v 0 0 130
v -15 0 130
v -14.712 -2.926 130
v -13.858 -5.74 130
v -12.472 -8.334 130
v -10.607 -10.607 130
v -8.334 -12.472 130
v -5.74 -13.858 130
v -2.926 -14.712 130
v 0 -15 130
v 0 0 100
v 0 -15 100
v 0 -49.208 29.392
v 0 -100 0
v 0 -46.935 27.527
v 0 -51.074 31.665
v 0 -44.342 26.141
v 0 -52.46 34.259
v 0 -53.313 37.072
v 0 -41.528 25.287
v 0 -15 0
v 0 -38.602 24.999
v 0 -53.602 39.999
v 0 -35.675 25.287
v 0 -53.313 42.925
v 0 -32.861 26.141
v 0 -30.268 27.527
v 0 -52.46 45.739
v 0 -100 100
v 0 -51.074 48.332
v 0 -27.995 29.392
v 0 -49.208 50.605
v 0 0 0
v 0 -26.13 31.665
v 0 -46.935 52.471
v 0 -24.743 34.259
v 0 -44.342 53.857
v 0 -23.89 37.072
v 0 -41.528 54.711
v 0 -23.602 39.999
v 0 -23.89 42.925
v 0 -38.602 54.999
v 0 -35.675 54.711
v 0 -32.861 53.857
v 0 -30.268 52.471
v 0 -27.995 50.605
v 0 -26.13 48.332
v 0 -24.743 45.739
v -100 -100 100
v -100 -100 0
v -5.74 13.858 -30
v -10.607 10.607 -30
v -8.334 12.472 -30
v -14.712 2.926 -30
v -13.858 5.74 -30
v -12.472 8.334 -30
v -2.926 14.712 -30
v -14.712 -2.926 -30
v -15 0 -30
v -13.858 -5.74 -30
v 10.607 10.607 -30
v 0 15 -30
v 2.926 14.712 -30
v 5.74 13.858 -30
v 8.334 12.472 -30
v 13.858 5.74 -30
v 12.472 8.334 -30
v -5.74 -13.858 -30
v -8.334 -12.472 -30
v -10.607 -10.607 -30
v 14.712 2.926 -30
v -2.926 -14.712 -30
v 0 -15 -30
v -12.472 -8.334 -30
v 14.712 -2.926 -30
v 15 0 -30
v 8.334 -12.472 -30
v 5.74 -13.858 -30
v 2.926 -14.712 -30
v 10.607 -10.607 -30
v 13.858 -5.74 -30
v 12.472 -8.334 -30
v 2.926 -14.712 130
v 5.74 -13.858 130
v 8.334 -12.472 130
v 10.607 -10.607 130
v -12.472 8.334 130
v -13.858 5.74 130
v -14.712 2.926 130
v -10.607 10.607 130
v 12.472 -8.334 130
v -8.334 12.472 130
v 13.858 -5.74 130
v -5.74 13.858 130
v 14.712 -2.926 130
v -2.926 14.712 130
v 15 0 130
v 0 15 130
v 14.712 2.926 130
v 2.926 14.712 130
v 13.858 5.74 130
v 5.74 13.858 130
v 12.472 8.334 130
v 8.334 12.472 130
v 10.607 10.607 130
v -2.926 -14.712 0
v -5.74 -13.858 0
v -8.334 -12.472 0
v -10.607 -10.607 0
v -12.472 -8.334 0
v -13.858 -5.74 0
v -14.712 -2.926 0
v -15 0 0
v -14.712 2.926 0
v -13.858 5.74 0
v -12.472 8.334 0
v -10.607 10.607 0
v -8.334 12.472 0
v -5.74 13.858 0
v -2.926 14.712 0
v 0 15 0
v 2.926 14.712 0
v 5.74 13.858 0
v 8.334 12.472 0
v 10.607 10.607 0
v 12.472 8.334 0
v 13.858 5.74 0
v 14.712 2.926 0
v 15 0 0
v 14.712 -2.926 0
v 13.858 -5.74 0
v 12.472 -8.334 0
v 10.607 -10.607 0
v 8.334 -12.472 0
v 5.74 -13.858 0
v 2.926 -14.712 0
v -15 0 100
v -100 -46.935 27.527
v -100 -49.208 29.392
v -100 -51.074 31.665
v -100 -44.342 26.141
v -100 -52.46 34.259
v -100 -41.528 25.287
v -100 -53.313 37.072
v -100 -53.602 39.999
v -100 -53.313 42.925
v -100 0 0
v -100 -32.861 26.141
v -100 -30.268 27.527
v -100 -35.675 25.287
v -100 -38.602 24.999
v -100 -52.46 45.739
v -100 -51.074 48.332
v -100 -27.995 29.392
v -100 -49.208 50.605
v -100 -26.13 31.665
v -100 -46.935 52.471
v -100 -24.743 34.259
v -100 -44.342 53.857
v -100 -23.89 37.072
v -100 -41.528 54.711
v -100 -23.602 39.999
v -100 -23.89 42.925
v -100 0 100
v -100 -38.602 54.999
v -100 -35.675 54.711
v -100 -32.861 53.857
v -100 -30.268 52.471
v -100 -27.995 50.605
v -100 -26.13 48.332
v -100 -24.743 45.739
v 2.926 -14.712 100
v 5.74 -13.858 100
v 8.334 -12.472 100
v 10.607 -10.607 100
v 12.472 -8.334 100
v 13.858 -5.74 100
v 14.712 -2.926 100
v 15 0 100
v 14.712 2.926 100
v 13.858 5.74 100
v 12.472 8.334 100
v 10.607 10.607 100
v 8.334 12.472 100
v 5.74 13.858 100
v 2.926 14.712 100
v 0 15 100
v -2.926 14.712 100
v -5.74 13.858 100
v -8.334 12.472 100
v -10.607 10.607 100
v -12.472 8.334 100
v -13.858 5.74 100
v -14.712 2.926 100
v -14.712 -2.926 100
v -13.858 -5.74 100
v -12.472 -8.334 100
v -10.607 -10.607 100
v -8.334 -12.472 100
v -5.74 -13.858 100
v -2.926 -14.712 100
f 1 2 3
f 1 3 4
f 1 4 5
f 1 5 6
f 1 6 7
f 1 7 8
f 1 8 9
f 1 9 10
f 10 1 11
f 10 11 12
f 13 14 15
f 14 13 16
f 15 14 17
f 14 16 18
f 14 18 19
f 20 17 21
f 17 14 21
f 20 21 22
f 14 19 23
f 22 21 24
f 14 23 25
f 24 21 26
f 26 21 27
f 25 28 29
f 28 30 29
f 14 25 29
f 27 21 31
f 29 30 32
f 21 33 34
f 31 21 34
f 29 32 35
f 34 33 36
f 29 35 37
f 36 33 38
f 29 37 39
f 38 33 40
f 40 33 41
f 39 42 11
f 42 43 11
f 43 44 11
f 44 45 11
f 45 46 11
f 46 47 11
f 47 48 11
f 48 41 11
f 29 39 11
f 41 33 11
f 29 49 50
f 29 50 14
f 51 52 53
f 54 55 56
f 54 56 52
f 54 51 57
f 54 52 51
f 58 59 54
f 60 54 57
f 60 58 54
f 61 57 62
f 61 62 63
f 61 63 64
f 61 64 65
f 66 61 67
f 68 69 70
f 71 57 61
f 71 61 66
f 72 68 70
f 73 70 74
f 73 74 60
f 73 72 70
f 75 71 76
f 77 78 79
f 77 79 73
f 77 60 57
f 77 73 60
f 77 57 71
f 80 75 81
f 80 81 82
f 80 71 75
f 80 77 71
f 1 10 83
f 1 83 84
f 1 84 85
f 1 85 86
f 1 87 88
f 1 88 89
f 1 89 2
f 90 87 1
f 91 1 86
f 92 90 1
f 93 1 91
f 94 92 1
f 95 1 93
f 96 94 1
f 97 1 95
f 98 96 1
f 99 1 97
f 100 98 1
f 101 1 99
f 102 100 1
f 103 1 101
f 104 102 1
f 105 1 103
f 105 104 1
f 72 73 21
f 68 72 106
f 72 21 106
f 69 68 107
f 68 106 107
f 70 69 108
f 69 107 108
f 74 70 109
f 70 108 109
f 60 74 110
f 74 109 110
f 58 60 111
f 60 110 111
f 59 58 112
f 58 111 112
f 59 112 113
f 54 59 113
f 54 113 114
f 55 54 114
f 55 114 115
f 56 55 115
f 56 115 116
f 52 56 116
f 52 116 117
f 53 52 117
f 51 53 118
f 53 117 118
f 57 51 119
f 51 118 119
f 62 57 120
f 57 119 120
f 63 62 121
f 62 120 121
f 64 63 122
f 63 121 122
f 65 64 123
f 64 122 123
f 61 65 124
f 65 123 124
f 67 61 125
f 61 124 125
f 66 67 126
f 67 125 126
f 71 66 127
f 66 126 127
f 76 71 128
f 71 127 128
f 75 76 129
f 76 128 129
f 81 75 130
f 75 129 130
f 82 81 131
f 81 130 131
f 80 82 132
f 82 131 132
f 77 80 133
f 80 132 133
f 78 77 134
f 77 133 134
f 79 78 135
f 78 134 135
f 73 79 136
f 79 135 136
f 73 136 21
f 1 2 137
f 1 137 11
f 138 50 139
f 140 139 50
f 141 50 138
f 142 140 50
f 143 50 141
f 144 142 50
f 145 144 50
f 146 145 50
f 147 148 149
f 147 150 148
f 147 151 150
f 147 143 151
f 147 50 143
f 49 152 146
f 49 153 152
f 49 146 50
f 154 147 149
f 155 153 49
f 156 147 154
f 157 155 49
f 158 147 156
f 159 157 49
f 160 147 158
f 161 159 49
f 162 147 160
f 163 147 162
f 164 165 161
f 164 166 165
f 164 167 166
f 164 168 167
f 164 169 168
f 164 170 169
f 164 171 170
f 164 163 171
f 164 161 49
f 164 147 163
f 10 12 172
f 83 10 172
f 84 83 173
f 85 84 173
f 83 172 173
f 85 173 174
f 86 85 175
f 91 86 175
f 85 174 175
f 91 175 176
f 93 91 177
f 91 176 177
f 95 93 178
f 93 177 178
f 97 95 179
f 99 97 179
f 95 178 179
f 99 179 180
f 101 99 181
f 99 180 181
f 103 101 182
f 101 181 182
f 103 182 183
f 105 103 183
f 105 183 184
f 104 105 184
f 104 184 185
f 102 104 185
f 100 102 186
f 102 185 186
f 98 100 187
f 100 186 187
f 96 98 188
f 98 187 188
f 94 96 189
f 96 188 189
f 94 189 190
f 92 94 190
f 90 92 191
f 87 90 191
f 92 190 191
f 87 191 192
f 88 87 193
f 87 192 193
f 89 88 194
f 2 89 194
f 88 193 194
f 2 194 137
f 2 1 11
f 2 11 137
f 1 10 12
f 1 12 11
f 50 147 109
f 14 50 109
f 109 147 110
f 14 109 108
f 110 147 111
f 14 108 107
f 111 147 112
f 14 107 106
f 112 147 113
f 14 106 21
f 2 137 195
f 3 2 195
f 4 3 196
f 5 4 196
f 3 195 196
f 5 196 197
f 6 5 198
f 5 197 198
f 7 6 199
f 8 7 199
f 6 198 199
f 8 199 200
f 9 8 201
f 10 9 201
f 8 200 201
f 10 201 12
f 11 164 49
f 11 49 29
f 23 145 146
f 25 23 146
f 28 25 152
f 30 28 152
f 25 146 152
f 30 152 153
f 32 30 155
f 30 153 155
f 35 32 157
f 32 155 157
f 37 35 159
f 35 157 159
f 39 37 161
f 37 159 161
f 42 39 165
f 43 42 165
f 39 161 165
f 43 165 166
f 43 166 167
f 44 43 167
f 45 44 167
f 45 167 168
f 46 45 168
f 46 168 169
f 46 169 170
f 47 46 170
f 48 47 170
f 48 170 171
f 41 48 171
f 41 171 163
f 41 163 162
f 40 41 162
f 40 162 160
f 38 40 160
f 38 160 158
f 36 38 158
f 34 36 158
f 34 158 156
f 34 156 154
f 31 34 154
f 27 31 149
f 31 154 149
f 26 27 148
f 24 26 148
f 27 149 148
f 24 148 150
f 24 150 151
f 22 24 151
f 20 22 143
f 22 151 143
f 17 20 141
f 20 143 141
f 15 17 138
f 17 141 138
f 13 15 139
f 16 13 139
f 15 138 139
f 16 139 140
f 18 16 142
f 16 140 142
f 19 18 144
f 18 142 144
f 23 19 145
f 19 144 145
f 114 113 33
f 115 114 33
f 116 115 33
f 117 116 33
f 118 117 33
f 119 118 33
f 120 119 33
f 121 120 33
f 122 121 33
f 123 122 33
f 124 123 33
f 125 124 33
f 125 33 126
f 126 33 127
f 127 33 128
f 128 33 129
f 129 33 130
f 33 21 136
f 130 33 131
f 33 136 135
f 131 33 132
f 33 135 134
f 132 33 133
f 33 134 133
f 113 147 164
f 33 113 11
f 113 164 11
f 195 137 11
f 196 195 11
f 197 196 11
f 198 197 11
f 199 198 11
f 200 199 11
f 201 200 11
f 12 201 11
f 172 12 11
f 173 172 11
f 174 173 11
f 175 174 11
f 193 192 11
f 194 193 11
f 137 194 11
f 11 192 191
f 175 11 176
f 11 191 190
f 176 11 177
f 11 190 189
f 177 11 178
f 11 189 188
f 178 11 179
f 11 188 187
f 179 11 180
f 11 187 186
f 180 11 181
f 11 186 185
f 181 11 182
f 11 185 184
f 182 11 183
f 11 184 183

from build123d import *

# Parameters (mm, degrees)
F0_W     = 100
F0_H     = 100
F1_DEPTH = 100
F3_DEPTH = 30
F4_DEPTH = 30
F6_DEPTH = 30
F8_D     = 30


with BuildPart() as f1:
    # F0 (on Front) → F1 (new body)
    with BuildSketch(Plane.XZ):
        with Locations((-50, 50)):
            Rectangle(F0_W, F0_H)
    extrude(amount=F1_DEPTH)

    # F5 (on face) → F6 (join)
    with BuildSketch(Plane(origin=(0, 0, 0), x_dir=(1, 0, 0), z_dir=(0, 0, -1))):
        with BuildLine():
            ThreePointArc((-15, 0), (0, -15), (15, 0))
            ThreePointArc((15, 0), (10.6066017178, 10.6066017178), (0, 15))
            Line((0, 15), (0, 0))
            Line((0, 0), (-15, 0))
        make_face()
        with BuildLine():
            Line((0, 0), (0, 15))
            ThreePointArc((0, 15), (-10.6066017178, 10.6066017178), (-15, 0))
            Line((-15, 0), (0, 0))
        make_face()
    extrude(amount=F6_DEPTH)

    # F8 (through all)
    with Locations(Plane.YZ):
        with Locations((-38.6016704142, 39.9988368154)):
            Hole(F8_D / 2)


with BuildPart() as f3:
    # F2 (on face) → F3 (new body)
    with BuildSketch(Plane.XY.offset(100)):
        with BuildLine():
            ThreePointArc((0, -15), (10.6066017178, -10.6066017178), (15, 0))
            ThreePointArc((15, 0), (0, 15), (-15, 0))
            Line((-15, 0), (0, 0))
            Line((0, 0), (0, -15))
        make_face()
    extrude(amount=F3_DEPTH)


with BuildPart() as f4:
    # F2 (on face) → F4 (new body)
    with BuildSketch(Plane.XY.offset(100)):
        with BuildLine():
            Line((0, 0), (-15, 0))
            ThreePointArc((-15, 0), (-10.6066017178, -10.6066017178), (0, -15))
            Line((0, -15), (0, 0))
        make_face()
    extrude(amount=F4_DEPTH)


solid = Compound([f1.part, f3.part, f4.part])
